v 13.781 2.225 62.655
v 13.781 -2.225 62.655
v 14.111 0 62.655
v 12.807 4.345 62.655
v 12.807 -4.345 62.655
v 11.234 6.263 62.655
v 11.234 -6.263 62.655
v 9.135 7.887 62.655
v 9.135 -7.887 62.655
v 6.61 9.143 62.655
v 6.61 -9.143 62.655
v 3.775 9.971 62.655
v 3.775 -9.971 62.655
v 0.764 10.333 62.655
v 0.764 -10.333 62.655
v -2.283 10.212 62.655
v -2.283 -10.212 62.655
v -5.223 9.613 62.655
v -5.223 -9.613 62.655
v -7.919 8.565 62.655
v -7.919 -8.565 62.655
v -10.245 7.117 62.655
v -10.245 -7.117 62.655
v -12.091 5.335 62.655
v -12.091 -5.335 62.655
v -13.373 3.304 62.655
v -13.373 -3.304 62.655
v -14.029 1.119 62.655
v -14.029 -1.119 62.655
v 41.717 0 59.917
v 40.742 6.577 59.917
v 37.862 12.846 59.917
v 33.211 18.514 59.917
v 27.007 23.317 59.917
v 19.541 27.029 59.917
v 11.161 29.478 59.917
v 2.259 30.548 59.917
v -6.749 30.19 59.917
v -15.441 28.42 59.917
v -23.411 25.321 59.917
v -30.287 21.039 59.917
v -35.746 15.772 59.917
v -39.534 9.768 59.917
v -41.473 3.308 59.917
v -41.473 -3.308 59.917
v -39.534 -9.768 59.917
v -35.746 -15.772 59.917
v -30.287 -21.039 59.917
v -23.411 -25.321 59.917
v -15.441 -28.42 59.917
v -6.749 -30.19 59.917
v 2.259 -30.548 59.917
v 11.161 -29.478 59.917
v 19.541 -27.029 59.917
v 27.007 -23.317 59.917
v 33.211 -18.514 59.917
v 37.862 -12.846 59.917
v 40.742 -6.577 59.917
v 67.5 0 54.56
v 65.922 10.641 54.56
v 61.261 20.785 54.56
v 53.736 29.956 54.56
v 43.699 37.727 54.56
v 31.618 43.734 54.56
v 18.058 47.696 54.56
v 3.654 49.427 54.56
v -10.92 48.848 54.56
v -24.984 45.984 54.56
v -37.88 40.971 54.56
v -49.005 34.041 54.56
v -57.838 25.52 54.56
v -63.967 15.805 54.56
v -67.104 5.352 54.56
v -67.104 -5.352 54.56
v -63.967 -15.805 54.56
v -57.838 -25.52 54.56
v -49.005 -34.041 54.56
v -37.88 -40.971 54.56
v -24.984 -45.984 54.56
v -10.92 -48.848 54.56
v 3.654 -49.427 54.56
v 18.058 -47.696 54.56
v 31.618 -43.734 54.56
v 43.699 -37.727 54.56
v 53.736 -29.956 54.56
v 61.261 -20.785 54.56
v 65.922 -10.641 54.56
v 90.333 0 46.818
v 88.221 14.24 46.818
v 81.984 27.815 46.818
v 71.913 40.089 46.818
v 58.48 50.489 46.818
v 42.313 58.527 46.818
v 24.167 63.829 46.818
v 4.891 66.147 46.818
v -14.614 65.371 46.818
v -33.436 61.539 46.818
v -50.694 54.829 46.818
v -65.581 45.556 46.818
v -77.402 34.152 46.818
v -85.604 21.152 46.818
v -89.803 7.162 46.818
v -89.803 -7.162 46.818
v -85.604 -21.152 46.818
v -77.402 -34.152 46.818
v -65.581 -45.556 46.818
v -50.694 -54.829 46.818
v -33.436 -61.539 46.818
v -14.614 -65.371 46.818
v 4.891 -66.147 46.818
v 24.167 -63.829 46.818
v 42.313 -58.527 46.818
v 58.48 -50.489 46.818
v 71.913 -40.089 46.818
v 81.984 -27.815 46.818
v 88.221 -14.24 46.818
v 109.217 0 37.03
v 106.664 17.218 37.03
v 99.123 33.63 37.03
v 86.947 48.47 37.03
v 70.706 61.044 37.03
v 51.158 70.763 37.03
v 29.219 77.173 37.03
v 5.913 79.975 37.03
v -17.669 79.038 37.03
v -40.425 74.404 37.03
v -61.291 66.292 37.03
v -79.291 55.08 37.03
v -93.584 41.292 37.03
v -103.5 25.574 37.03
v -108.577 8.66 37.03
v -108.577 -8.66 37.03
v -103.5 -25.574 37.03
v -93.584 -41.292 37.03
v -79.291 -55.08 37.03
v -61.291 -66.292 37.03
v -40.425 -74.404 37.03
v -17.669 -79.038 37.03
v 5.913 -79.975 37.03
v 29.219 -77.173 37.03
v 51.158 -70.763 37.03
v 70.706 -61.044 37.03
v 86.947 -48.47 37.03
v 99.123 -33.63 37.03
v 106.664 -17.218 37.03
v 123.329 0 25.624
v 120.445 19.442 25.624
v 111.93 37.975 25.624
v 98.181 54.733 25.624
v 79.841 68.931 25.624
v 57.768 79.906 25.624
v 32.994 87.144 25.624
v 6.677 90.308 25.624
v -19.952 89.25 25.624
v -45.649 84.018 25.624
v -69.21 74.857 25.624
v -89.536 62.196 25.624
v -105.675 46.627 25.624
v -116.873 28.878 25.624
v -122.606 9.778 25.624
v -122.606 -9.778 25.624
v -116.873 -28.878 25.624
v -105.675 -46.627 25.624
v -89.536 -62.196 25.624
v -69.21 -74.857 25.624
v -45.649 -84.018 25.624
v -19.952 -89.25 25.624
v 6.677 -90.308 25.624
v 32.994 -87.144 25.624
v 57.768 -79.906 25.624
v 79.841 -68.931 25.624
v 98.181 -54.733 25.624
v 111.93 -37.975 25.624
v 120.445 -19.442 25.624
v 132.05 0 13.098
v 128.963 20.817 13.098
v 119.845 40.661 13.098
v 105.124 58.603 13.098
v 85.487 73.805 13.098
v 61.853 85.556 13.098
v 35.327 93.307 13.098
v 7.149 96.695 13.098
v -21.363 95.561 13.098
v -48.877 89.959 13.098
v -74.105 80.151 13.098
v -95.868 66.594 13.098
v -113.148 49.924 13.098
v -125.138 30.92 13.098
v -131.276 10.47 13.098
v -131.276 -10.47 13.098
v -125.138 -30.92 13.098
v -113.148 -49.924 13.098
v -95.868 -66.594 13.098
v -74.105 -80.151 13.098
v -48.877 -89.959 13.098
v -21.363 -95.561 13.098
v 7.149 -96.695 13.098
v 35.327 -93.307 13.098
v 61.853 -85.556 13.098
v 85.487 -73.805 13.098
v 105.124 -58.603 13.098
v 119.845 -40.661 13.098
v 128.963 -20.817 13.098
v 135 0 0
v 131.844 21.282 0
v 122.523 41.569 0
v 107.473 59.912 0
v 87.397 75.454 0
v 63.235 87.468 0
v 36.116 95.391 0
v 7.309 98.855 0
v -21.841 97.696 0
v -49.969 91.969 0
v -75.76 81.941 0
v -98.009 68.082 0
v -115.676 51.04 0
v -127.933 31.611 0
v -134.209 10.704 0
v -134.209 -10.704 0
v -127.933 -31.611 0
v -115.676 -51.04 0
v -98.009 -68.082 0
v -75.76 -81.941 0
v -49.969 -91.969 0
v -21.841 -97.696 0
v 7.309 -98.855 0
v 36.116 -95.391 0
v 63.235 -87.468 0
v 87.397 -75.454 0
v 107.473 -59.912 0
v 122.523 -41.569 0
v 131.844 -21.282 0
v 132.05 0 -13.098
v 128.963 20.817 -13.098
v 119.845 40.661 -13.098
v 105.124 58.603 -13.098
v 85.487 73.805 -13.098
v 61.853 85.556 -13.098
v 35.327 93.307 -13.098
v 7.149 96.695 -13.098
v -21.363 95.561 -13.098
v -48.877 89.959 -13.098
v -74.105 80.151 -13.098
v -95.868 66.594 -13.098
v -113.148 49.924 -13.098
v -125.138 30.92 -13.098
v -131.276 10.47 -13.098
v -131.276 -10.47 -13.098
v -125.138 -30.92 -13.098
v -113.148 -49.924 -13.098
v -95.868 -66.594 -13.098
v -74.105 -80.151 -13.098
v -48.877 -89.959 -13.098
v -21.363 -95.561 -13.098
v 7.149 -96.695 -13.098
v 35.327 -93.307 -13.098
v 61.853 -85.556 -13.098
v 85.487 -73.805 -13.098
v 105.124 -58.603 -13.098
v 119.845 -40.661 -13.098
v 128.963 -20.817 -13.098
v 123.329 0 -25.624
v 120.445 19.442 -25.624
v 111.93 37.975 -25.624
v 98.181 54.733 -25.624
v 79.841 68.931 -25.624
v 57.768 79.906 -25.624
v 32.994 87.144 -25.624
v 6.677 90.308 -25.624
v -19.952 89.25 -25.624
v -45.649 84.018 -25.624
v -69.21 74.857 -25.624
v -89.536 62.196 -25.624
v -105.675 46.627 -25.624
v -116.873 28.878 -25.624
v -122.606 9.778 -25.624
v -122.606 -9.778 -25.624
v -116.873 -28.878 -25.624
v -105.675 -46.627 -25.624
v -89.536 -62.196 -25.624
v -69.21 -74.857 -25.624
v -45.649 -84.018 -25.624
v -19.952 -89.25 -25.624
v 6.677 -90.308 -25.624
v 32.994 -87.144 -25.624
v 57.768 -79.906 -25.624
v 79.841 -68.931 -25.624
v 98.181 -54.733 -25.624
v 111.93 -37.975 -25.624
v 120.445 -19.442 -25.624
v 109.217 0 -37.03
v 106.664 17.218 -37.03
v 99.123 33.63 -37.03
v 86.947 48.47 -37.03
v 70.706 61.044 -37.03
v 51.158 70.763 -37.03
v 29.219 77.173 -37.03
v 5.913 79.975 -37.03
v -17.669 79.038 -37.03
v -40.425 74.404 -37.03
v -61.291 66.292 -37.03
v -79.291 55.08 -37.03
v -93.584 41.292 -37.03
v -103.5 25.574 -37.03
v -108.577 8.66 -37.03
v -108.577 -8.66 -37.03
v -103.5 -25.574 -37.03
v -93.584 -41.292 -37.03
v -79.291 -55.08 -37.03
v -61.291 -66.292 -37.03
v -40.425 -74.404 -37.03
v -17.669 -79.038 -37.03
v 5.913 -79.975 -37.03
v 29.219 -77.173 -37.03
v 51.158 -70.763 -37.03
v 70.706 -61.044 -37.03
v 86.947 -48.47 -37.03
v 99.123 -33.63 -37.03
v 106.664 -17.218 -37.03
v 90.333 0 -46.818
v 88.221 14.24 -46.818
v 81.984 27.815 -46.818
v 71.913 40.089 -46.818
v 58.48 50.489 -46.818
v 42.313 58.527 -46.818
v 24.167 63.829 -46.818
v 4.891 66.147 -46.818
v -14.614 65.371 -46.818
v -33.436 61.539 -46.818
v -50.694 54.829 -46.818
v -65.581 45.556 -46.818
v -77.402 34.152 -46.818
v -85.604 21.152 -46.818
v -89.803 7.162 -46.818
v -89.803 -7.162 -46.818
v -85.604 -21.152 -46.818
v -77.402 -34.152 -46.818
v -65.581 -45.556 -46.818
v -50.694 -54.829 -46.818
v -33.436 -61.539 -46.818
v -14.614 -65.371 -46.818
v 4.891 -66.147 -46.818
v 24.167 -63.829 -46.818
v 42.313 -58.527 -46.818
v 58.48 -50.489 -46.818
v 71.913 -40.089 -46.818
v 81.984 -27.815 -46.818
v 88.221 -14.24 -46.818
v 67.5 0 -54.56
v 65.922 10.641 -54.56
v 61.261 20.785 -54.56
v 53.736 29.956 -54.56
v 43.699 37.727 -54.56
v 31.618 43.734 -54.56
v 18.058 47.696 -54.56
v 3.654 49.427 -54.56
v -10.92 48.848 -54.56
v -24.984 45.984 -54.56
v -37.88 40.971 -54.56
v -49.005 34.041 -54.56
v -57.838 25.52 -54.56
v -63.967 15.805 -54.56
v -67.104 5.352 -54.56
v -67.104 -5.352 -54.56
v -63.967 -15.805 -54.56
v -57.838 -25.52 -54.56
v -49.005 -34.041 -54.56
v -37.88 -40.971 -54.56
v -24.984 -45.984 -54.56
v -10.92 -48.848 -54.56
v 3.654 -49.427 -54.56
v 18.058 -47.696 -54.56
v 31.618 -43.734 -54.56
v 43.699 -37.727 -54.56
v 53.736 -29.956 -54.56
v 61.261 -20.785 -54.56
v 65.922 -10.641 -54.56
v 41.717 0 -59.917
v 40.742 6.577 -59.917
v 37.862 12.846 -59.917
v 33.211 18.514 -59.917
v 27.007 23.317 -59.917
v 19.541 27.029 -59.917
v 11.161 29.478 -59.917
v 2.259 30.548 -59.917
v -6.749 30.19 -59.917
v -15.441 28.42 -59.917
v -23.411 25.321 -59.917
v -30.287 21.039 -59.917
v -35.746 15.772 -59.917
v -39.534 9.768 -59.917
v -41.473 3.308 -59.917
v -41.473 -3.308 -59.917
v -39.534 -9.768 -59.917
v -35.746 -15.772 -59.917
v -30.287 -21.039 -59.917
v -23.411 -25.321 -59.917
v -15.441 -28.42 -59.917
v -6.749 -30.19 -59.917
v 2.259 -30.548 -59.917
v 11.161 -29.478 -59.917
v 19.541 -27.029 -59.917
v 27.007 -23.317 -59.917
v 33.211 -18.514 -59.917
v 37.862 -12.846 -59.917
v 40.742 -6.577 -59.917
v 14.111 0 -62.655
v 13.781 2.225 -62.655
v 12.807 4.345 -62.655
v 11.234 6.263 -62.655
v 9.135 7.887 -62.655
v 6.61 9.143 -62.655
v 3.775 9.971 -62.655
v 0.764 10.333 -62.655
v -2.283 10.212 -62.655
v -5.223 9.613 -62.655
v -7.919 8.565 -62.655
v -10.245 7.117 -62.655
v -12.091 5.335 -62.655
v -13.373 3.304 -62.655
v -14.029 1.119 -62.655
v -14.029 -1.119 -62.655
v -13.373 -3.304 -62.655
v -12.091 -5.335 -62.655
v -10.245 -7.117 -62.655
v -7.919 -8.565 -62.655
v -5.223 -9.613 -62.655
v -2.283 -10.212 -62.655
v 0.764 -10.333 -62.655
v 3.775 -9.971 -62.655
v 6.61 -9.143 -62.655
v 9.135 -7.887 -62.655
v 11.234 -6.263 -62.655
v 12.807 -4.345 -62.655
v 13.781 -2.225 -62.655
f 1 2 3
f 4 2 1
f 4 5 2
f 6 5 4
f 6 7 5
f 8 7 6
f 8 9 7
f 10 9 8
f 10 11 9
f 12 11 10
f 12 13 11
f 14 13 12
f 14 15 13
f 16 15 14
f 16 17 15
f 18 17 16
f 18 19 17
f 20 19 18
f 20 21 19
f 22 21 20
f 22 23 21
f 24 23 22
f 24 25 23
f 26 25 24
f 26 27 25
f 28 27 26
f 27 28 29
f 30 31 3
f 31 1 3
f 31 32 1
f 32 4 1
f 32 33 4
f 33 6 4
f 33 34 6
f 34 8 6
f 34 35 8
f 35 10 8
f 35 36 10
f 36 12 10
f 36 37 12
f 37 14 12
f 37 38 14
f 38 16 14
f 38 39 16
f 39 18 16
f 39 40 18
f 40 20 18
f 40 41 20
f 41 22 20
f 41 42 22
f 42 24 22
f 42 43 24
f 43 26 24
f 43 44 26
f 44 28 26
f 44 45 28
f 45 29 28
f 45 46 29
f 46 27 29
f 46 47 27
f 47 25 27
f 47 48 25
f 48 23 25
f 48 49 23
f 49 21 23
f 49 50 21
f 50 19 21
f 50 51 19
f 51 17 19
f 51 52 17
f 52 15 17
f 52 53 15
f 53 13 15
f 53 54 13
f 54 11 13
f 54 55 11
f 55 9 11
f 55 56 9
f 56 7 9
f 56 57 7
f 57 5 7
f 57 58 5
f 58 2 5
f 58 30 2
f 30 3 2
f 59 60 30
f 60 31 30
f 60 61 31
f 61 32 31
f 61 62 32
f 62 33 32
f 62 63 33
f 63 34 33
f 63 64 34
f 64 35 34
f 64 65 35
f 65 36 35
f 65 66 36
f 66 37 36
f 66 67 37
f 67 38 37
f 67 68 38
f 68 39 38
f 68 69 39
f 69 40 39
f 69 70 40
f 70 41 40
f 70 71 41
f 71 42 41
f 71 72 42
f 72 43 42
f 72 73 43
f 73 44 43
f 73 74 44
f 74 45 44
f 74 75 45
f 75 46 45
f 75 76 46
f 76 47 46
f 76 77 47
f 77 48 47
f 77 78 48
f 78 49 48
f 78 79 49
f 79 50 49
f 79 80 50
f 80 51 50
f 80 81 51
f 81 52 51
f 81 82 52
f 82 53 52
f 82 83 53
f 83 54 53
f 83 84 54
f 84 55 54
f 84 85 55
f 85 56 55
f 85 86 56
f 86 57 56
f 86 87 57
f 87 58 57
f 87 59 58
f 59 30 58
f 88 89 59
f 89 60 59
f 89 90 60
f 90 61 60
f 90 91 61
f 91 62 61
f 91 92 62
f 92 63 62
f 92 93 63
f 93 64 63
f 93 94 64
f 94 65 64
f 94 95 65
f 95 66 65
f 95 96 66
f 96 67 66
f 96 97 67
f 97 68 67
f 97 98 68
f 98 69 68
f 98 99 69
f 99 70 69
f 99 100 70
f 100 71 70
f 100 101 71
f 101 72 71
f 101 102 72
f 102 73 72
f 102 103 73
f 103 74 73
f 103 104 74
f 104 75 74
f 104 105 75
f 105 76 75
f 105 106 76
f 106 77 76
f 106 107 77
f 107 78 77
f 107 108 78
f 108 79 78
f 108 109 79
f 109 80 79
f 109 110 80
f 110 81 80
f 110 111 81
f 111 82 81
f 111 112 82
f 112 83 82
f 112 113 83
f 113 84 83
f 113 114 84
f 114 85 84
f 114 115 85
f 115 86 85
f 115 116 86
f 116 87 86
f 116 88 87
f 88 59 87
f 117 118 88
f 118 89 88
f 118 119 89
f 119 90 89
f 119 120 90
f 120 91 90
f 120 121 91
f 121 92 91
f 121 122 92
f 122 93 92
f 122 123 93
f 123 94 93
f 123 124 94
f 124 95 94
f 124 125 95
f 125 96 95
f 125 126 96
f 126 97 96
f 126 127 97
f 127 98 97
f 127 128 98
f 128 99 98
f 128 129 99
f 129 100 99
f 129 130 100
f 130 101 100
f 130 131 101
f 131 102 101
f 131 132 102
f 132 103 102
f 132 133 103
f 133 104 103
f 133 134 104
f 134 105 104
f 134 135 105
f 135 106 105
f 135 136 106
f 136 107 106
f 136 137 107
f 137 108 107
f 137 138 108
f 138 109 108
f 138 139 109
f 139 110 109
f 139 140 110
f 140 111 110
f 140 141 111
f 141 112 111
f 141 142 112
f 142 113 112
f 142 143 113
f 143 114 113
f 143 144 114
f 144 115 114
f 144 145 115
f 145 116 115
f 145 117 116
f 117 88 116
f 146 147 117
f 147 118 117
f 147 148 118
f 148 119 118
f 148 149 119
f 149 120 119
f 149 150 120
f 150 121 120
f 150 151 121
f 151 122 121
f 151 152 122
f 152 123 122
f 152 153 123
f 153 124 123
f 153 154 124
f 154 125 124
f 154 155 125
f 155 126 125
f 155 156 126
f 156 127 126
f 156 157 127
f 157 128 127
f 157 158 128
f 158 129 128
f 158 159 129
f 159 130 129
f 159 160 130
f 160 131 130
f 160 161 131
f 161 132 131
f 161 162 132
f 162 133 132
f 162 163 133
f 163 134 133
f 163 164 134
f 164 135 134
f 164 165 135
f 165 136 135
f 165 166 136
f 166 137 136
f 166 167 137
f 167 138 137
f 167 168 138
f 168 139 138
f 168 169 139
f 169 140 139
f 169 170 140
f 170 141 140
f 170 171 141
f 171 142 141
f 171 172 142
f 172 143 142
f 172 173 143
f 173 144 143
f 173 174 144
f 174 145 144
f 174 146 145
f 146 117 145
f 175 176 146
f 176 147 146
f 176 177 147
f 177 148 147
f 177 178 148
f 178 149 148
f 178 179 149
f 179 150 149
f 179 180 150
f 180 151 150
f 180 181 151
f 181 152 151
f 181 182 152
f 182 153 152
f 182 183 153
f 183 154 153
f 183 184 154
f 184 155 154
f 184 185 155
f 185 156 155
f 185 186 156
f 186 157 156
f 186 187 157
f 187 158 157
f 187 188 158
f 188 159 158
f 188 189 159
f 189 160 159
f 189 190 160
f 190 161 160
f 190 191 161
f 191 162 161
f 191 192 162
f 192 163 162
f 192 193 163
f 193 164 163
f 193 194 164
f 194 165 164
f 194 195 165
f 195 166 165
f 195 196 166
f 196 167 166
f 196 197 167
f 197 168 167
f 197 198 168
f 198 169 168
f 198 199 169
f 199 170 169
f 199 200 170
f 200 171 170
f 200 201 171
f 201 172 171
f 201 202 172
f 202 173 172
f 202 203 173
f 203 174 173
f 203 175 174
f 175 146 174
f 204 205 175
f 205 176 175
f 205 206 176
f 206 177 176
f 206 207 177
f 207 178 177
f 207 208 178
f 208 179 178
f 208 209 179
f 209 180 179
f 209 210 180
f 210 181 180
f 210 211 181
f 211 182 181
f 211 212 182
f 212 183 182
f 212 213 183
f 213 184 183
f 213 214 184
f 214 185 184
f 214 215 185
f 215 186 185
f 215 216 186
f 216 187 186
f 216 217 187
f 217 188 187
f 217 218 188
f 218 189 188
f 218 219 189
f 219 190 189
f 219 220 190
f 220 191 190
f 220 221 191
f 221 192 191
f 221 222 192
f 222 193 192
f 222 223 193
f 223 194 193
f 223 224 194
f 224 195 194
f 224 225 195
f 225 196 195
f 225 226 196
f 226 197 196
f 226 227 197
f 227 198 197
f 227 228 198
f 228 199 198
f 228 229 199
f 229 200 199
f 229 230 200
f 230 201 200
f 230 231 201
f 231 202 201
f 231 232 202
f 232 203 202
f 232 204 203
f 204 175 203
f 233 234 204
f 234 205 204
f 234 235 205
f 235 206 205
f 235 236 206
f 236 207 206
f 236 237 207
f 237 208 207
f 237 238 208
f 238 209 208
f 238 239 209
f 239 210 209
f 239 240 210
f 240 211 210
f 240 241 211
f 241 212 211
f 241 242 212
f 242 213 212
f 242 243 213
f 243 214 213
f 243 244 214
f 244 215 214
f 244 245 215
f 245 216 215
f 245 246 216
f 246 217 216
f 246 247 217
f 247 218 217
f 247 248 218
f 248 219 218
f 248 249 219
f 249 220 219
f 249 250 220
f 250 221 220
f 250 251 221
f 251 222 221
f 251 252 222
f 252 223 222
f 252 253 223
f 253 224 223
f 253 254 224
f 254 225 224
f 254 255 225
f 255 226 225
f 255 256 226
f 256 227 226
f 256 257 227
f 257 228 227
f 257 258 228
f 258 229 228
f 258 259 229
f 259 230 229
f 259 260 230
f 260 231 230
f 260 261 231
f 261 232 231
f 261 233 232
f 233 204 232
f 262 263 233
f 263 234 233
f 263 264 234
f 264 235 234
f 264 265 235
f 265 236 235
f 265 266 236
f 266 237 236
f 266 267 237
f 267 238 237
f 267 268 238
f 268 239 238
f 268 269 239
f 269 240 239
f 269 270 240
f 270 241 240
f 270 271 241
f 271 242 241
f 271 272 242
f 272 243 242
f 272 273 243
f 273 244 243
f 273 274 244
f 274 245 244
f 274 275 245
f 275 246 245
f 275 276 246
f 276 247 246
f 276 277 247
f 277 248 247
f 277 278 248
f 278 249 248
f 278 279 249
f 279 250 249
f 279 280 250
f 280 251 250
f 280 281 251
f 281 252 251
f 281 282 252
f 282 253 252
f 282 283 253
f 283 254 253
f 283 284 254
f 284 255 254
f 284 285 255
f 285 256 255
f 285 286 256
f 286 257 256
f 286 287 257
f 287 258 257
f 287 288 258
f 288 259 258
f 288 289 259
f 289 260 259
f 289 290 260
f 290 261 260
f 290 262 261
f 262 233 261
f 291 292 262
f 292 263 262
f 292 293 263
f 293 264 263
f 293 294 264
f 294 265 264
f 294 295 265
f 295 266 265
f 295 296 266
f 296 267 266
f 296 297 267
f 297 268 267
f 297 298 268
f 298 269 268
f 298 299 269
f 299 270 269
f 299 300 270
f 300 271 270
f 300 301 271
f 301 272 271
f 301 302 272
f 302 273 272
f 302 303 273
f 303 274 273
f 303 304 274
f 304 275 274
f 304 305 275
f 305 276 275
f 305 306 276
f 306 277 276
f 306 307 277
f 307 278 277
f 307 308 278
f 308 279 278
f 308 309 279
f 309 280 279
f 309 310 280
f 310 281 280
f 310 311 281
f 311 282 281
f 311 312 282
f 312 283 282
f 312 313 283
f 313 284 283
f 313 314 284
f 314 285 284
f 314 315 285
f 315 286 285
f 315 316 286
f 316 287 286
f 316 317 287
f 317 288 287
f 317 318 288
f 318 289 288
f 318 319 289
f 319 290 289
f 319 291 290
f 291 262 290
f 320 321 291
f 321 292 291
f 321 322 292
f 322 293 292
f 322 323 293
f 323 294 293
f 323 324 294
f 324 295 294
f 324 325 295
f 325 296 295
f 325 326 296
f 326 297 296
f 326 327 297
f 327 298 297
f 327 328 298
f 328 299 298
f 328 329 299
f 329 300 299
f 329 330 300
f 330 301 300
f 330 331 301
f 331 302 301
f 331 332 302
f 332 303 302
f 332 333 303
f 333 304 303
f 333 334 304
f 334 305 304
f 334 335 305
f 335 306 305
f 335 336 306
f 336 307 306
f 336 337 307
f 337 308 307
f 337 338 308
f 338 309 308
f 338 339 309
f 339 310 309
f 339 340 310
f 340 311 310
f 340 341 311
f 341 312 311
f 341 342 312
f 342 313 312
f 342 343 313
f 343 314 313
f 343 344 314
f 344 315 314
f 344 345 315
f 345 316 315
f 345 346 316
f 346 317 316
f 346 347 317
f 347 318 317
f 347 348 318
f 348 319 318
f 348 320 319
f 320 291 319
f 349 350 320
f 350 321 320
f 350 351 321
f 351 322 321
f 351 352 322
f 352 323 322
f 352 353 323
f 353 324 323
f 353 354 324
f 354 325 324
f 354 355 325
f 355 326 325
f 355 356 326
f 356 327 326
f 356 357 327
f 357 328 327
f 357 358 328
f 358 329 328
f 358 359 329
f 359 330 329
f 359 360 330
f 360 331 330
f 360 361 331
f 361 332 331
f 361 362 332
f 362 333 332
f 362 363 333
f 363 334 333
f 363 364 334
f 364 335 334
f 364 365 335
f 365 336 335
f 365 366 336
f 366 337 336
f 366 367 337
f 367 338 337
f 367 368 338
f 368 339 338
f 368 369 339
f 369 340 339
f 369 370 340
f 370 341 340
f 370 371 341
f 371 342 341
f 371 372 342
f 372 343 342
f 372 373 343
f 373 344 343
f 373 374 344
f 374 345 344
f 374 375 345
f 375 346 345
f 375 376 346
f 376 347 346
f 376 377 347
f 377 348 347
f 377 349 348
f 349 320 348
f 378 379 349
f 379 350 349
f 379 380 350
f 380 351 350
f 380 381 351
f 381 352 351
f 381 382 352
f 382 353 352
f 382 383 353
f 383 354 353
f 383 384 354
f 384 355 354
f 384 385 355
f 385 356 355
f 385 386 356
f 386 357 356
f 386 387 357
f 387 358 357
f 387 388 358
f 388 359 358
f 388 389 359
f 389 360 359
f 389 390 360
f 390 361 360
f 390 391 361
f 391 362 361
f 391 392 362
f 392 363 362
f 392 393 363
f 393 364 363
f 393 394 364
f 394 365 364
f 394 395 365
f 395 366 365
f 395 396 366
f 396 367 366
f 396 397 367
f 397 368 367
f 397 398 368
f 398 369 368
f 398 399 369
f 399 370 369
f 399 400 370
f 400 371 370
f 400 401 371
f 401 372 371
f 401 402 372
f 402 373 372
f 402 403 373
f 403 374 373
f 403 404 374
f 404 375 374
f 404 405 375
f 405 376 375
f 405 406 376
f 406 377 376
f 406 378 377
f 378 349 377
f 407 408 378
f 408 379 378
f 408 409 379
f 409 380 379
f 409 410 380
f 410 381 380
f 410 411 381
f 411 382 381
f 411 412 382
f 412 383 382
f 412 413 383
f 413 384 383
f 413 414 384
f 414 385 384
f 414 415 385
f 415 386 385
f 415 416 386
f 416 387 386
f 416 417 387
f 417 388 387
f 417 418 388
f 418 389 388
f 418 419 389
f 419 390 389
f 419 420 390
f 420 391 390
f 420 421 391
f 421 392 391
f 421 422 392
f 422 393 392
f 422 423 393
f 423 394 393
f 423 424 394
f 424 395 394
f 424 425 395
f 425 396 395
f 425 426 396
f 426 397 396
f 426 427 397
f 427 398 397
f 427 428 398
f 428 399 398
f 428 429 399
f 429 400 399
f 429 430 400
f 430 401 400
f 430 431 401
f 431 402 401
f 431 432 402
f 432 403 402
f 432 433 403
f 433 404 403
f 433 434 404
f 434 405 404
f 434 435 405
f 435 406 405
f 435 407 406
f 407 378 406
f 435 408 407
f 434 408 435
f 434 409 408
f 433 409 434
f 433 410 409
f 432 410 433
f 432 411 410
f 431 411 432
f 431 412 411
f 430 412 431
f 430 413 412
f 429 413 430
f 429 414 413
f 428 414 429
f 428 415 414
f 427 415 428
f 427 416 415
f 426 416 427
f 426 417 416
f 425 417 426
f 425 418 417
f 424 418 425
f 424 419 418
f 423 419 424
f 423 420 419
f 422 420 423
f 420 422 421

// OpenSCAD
// Generated by SolidPython 1.0.1 on 2020-07-29 00:46:52


scale(v = [15, 11, 7]) {
	sphere(r = 9);
}
/***********************************************
*********      SolidPython code:      **********
************************************************
 
# import packages: SolidPython
from solid import *
from solid.utils import *
from itertools import chain, combinations, permutations


class Resize:

    def __init__(self, scad_file):
        self.scad_file = scad_file
        #self.scad_file = import_scad(scad_file)
        # cone/cylinder param:
        self.r1 = 0
        self.r2 = 0
        self.h = 0
        # rectangular prism param:
        self.w = 0
        self.l = 0
        # ellipse param:
        self.r = 0

    # import OpenScad code (file name corresponds to shape)


    # classify shape + parameters
    def assign(self, param1, param2, param3):
        if self.scad_file == 'cone.scad':
            self.r1 = param1
            self.r2 = param2
            self.h = param3
        elif self.scad_file == 'cylinder.scad':
            self.r1 = param1
            self.r2 = param2
            self.h = param3
        elif self.scad_file == 'rectangularPrism.scad':
            self.h = param1
            self.l = param2
            self.w = param3
        else:
            self.r = param1
            self.h = param2

    # resize parameters
    def iterate(self):
        x = range(3, 20, 2)
        i = 1
        if self.scad_file == 'cone.scad':
            tempList = list(permutations(x, 2))
            for temp in tempList:
                param1 = temp[0]
                param2 = temp[1]
                filepath = 'produced_scad_files/' + 'cone' + str(param1) + '_' + str(param2) + '_' + '.scad'
                scad_render_to_file(cylinder(h=param1, r1=param2, r2=0), filepath)

        elif self.scad_file == 'cylinder.scad':
            tempList = list(permutations(x, 3))
            for temp in tempList:
                param1 = temp[0]
                param2 = temp[1]
                filepath = 'produced_scad_files/' + 'cylinder' + str(param1) + '_' + str(param2) + '_' + '.scad'
                scad_render_to_file(cylinder(h=param1, r1=param2, r2=param2), filepath)

        elif self.scad_file == 'rectangularPrism.scad':
            tempList = list(permutations(x, 3))
            for temp in tempList:
                param1 = temp[0]
                param2 = temp[1]
                param3 = temp[2]
                filepath = 'produced_scad_files/' + 'rectangularPrism' + str(param1) + '_' + str(param2) + '_' + str(
                    param3) + '.scad'
                scad_render_to_file(cube(size=(param1, param2, param3)), filepath)

        elif self.scad_file == 'ellipse.scad':
            tempList = list(permutations(x, 4))
            for temp in tempList:
                param1 = temp[0]
                param2 = temp[1]
                param3 = temp[2]
                param4 = temp[3]
                filepath = 'produced_scad_files/' + 'ellipse' + str(param1) + '_' + str(param2) + '_' + str(param3) + '_' + str(param4) + '.scad'
                scad_render_to_file(scale([param1, param2, param3])(sphere(r=param4)), filepath)

    def render_to_scadfile(self):
        scad_render_to_file(scad, 'example.scad') 
 
************************************************/
